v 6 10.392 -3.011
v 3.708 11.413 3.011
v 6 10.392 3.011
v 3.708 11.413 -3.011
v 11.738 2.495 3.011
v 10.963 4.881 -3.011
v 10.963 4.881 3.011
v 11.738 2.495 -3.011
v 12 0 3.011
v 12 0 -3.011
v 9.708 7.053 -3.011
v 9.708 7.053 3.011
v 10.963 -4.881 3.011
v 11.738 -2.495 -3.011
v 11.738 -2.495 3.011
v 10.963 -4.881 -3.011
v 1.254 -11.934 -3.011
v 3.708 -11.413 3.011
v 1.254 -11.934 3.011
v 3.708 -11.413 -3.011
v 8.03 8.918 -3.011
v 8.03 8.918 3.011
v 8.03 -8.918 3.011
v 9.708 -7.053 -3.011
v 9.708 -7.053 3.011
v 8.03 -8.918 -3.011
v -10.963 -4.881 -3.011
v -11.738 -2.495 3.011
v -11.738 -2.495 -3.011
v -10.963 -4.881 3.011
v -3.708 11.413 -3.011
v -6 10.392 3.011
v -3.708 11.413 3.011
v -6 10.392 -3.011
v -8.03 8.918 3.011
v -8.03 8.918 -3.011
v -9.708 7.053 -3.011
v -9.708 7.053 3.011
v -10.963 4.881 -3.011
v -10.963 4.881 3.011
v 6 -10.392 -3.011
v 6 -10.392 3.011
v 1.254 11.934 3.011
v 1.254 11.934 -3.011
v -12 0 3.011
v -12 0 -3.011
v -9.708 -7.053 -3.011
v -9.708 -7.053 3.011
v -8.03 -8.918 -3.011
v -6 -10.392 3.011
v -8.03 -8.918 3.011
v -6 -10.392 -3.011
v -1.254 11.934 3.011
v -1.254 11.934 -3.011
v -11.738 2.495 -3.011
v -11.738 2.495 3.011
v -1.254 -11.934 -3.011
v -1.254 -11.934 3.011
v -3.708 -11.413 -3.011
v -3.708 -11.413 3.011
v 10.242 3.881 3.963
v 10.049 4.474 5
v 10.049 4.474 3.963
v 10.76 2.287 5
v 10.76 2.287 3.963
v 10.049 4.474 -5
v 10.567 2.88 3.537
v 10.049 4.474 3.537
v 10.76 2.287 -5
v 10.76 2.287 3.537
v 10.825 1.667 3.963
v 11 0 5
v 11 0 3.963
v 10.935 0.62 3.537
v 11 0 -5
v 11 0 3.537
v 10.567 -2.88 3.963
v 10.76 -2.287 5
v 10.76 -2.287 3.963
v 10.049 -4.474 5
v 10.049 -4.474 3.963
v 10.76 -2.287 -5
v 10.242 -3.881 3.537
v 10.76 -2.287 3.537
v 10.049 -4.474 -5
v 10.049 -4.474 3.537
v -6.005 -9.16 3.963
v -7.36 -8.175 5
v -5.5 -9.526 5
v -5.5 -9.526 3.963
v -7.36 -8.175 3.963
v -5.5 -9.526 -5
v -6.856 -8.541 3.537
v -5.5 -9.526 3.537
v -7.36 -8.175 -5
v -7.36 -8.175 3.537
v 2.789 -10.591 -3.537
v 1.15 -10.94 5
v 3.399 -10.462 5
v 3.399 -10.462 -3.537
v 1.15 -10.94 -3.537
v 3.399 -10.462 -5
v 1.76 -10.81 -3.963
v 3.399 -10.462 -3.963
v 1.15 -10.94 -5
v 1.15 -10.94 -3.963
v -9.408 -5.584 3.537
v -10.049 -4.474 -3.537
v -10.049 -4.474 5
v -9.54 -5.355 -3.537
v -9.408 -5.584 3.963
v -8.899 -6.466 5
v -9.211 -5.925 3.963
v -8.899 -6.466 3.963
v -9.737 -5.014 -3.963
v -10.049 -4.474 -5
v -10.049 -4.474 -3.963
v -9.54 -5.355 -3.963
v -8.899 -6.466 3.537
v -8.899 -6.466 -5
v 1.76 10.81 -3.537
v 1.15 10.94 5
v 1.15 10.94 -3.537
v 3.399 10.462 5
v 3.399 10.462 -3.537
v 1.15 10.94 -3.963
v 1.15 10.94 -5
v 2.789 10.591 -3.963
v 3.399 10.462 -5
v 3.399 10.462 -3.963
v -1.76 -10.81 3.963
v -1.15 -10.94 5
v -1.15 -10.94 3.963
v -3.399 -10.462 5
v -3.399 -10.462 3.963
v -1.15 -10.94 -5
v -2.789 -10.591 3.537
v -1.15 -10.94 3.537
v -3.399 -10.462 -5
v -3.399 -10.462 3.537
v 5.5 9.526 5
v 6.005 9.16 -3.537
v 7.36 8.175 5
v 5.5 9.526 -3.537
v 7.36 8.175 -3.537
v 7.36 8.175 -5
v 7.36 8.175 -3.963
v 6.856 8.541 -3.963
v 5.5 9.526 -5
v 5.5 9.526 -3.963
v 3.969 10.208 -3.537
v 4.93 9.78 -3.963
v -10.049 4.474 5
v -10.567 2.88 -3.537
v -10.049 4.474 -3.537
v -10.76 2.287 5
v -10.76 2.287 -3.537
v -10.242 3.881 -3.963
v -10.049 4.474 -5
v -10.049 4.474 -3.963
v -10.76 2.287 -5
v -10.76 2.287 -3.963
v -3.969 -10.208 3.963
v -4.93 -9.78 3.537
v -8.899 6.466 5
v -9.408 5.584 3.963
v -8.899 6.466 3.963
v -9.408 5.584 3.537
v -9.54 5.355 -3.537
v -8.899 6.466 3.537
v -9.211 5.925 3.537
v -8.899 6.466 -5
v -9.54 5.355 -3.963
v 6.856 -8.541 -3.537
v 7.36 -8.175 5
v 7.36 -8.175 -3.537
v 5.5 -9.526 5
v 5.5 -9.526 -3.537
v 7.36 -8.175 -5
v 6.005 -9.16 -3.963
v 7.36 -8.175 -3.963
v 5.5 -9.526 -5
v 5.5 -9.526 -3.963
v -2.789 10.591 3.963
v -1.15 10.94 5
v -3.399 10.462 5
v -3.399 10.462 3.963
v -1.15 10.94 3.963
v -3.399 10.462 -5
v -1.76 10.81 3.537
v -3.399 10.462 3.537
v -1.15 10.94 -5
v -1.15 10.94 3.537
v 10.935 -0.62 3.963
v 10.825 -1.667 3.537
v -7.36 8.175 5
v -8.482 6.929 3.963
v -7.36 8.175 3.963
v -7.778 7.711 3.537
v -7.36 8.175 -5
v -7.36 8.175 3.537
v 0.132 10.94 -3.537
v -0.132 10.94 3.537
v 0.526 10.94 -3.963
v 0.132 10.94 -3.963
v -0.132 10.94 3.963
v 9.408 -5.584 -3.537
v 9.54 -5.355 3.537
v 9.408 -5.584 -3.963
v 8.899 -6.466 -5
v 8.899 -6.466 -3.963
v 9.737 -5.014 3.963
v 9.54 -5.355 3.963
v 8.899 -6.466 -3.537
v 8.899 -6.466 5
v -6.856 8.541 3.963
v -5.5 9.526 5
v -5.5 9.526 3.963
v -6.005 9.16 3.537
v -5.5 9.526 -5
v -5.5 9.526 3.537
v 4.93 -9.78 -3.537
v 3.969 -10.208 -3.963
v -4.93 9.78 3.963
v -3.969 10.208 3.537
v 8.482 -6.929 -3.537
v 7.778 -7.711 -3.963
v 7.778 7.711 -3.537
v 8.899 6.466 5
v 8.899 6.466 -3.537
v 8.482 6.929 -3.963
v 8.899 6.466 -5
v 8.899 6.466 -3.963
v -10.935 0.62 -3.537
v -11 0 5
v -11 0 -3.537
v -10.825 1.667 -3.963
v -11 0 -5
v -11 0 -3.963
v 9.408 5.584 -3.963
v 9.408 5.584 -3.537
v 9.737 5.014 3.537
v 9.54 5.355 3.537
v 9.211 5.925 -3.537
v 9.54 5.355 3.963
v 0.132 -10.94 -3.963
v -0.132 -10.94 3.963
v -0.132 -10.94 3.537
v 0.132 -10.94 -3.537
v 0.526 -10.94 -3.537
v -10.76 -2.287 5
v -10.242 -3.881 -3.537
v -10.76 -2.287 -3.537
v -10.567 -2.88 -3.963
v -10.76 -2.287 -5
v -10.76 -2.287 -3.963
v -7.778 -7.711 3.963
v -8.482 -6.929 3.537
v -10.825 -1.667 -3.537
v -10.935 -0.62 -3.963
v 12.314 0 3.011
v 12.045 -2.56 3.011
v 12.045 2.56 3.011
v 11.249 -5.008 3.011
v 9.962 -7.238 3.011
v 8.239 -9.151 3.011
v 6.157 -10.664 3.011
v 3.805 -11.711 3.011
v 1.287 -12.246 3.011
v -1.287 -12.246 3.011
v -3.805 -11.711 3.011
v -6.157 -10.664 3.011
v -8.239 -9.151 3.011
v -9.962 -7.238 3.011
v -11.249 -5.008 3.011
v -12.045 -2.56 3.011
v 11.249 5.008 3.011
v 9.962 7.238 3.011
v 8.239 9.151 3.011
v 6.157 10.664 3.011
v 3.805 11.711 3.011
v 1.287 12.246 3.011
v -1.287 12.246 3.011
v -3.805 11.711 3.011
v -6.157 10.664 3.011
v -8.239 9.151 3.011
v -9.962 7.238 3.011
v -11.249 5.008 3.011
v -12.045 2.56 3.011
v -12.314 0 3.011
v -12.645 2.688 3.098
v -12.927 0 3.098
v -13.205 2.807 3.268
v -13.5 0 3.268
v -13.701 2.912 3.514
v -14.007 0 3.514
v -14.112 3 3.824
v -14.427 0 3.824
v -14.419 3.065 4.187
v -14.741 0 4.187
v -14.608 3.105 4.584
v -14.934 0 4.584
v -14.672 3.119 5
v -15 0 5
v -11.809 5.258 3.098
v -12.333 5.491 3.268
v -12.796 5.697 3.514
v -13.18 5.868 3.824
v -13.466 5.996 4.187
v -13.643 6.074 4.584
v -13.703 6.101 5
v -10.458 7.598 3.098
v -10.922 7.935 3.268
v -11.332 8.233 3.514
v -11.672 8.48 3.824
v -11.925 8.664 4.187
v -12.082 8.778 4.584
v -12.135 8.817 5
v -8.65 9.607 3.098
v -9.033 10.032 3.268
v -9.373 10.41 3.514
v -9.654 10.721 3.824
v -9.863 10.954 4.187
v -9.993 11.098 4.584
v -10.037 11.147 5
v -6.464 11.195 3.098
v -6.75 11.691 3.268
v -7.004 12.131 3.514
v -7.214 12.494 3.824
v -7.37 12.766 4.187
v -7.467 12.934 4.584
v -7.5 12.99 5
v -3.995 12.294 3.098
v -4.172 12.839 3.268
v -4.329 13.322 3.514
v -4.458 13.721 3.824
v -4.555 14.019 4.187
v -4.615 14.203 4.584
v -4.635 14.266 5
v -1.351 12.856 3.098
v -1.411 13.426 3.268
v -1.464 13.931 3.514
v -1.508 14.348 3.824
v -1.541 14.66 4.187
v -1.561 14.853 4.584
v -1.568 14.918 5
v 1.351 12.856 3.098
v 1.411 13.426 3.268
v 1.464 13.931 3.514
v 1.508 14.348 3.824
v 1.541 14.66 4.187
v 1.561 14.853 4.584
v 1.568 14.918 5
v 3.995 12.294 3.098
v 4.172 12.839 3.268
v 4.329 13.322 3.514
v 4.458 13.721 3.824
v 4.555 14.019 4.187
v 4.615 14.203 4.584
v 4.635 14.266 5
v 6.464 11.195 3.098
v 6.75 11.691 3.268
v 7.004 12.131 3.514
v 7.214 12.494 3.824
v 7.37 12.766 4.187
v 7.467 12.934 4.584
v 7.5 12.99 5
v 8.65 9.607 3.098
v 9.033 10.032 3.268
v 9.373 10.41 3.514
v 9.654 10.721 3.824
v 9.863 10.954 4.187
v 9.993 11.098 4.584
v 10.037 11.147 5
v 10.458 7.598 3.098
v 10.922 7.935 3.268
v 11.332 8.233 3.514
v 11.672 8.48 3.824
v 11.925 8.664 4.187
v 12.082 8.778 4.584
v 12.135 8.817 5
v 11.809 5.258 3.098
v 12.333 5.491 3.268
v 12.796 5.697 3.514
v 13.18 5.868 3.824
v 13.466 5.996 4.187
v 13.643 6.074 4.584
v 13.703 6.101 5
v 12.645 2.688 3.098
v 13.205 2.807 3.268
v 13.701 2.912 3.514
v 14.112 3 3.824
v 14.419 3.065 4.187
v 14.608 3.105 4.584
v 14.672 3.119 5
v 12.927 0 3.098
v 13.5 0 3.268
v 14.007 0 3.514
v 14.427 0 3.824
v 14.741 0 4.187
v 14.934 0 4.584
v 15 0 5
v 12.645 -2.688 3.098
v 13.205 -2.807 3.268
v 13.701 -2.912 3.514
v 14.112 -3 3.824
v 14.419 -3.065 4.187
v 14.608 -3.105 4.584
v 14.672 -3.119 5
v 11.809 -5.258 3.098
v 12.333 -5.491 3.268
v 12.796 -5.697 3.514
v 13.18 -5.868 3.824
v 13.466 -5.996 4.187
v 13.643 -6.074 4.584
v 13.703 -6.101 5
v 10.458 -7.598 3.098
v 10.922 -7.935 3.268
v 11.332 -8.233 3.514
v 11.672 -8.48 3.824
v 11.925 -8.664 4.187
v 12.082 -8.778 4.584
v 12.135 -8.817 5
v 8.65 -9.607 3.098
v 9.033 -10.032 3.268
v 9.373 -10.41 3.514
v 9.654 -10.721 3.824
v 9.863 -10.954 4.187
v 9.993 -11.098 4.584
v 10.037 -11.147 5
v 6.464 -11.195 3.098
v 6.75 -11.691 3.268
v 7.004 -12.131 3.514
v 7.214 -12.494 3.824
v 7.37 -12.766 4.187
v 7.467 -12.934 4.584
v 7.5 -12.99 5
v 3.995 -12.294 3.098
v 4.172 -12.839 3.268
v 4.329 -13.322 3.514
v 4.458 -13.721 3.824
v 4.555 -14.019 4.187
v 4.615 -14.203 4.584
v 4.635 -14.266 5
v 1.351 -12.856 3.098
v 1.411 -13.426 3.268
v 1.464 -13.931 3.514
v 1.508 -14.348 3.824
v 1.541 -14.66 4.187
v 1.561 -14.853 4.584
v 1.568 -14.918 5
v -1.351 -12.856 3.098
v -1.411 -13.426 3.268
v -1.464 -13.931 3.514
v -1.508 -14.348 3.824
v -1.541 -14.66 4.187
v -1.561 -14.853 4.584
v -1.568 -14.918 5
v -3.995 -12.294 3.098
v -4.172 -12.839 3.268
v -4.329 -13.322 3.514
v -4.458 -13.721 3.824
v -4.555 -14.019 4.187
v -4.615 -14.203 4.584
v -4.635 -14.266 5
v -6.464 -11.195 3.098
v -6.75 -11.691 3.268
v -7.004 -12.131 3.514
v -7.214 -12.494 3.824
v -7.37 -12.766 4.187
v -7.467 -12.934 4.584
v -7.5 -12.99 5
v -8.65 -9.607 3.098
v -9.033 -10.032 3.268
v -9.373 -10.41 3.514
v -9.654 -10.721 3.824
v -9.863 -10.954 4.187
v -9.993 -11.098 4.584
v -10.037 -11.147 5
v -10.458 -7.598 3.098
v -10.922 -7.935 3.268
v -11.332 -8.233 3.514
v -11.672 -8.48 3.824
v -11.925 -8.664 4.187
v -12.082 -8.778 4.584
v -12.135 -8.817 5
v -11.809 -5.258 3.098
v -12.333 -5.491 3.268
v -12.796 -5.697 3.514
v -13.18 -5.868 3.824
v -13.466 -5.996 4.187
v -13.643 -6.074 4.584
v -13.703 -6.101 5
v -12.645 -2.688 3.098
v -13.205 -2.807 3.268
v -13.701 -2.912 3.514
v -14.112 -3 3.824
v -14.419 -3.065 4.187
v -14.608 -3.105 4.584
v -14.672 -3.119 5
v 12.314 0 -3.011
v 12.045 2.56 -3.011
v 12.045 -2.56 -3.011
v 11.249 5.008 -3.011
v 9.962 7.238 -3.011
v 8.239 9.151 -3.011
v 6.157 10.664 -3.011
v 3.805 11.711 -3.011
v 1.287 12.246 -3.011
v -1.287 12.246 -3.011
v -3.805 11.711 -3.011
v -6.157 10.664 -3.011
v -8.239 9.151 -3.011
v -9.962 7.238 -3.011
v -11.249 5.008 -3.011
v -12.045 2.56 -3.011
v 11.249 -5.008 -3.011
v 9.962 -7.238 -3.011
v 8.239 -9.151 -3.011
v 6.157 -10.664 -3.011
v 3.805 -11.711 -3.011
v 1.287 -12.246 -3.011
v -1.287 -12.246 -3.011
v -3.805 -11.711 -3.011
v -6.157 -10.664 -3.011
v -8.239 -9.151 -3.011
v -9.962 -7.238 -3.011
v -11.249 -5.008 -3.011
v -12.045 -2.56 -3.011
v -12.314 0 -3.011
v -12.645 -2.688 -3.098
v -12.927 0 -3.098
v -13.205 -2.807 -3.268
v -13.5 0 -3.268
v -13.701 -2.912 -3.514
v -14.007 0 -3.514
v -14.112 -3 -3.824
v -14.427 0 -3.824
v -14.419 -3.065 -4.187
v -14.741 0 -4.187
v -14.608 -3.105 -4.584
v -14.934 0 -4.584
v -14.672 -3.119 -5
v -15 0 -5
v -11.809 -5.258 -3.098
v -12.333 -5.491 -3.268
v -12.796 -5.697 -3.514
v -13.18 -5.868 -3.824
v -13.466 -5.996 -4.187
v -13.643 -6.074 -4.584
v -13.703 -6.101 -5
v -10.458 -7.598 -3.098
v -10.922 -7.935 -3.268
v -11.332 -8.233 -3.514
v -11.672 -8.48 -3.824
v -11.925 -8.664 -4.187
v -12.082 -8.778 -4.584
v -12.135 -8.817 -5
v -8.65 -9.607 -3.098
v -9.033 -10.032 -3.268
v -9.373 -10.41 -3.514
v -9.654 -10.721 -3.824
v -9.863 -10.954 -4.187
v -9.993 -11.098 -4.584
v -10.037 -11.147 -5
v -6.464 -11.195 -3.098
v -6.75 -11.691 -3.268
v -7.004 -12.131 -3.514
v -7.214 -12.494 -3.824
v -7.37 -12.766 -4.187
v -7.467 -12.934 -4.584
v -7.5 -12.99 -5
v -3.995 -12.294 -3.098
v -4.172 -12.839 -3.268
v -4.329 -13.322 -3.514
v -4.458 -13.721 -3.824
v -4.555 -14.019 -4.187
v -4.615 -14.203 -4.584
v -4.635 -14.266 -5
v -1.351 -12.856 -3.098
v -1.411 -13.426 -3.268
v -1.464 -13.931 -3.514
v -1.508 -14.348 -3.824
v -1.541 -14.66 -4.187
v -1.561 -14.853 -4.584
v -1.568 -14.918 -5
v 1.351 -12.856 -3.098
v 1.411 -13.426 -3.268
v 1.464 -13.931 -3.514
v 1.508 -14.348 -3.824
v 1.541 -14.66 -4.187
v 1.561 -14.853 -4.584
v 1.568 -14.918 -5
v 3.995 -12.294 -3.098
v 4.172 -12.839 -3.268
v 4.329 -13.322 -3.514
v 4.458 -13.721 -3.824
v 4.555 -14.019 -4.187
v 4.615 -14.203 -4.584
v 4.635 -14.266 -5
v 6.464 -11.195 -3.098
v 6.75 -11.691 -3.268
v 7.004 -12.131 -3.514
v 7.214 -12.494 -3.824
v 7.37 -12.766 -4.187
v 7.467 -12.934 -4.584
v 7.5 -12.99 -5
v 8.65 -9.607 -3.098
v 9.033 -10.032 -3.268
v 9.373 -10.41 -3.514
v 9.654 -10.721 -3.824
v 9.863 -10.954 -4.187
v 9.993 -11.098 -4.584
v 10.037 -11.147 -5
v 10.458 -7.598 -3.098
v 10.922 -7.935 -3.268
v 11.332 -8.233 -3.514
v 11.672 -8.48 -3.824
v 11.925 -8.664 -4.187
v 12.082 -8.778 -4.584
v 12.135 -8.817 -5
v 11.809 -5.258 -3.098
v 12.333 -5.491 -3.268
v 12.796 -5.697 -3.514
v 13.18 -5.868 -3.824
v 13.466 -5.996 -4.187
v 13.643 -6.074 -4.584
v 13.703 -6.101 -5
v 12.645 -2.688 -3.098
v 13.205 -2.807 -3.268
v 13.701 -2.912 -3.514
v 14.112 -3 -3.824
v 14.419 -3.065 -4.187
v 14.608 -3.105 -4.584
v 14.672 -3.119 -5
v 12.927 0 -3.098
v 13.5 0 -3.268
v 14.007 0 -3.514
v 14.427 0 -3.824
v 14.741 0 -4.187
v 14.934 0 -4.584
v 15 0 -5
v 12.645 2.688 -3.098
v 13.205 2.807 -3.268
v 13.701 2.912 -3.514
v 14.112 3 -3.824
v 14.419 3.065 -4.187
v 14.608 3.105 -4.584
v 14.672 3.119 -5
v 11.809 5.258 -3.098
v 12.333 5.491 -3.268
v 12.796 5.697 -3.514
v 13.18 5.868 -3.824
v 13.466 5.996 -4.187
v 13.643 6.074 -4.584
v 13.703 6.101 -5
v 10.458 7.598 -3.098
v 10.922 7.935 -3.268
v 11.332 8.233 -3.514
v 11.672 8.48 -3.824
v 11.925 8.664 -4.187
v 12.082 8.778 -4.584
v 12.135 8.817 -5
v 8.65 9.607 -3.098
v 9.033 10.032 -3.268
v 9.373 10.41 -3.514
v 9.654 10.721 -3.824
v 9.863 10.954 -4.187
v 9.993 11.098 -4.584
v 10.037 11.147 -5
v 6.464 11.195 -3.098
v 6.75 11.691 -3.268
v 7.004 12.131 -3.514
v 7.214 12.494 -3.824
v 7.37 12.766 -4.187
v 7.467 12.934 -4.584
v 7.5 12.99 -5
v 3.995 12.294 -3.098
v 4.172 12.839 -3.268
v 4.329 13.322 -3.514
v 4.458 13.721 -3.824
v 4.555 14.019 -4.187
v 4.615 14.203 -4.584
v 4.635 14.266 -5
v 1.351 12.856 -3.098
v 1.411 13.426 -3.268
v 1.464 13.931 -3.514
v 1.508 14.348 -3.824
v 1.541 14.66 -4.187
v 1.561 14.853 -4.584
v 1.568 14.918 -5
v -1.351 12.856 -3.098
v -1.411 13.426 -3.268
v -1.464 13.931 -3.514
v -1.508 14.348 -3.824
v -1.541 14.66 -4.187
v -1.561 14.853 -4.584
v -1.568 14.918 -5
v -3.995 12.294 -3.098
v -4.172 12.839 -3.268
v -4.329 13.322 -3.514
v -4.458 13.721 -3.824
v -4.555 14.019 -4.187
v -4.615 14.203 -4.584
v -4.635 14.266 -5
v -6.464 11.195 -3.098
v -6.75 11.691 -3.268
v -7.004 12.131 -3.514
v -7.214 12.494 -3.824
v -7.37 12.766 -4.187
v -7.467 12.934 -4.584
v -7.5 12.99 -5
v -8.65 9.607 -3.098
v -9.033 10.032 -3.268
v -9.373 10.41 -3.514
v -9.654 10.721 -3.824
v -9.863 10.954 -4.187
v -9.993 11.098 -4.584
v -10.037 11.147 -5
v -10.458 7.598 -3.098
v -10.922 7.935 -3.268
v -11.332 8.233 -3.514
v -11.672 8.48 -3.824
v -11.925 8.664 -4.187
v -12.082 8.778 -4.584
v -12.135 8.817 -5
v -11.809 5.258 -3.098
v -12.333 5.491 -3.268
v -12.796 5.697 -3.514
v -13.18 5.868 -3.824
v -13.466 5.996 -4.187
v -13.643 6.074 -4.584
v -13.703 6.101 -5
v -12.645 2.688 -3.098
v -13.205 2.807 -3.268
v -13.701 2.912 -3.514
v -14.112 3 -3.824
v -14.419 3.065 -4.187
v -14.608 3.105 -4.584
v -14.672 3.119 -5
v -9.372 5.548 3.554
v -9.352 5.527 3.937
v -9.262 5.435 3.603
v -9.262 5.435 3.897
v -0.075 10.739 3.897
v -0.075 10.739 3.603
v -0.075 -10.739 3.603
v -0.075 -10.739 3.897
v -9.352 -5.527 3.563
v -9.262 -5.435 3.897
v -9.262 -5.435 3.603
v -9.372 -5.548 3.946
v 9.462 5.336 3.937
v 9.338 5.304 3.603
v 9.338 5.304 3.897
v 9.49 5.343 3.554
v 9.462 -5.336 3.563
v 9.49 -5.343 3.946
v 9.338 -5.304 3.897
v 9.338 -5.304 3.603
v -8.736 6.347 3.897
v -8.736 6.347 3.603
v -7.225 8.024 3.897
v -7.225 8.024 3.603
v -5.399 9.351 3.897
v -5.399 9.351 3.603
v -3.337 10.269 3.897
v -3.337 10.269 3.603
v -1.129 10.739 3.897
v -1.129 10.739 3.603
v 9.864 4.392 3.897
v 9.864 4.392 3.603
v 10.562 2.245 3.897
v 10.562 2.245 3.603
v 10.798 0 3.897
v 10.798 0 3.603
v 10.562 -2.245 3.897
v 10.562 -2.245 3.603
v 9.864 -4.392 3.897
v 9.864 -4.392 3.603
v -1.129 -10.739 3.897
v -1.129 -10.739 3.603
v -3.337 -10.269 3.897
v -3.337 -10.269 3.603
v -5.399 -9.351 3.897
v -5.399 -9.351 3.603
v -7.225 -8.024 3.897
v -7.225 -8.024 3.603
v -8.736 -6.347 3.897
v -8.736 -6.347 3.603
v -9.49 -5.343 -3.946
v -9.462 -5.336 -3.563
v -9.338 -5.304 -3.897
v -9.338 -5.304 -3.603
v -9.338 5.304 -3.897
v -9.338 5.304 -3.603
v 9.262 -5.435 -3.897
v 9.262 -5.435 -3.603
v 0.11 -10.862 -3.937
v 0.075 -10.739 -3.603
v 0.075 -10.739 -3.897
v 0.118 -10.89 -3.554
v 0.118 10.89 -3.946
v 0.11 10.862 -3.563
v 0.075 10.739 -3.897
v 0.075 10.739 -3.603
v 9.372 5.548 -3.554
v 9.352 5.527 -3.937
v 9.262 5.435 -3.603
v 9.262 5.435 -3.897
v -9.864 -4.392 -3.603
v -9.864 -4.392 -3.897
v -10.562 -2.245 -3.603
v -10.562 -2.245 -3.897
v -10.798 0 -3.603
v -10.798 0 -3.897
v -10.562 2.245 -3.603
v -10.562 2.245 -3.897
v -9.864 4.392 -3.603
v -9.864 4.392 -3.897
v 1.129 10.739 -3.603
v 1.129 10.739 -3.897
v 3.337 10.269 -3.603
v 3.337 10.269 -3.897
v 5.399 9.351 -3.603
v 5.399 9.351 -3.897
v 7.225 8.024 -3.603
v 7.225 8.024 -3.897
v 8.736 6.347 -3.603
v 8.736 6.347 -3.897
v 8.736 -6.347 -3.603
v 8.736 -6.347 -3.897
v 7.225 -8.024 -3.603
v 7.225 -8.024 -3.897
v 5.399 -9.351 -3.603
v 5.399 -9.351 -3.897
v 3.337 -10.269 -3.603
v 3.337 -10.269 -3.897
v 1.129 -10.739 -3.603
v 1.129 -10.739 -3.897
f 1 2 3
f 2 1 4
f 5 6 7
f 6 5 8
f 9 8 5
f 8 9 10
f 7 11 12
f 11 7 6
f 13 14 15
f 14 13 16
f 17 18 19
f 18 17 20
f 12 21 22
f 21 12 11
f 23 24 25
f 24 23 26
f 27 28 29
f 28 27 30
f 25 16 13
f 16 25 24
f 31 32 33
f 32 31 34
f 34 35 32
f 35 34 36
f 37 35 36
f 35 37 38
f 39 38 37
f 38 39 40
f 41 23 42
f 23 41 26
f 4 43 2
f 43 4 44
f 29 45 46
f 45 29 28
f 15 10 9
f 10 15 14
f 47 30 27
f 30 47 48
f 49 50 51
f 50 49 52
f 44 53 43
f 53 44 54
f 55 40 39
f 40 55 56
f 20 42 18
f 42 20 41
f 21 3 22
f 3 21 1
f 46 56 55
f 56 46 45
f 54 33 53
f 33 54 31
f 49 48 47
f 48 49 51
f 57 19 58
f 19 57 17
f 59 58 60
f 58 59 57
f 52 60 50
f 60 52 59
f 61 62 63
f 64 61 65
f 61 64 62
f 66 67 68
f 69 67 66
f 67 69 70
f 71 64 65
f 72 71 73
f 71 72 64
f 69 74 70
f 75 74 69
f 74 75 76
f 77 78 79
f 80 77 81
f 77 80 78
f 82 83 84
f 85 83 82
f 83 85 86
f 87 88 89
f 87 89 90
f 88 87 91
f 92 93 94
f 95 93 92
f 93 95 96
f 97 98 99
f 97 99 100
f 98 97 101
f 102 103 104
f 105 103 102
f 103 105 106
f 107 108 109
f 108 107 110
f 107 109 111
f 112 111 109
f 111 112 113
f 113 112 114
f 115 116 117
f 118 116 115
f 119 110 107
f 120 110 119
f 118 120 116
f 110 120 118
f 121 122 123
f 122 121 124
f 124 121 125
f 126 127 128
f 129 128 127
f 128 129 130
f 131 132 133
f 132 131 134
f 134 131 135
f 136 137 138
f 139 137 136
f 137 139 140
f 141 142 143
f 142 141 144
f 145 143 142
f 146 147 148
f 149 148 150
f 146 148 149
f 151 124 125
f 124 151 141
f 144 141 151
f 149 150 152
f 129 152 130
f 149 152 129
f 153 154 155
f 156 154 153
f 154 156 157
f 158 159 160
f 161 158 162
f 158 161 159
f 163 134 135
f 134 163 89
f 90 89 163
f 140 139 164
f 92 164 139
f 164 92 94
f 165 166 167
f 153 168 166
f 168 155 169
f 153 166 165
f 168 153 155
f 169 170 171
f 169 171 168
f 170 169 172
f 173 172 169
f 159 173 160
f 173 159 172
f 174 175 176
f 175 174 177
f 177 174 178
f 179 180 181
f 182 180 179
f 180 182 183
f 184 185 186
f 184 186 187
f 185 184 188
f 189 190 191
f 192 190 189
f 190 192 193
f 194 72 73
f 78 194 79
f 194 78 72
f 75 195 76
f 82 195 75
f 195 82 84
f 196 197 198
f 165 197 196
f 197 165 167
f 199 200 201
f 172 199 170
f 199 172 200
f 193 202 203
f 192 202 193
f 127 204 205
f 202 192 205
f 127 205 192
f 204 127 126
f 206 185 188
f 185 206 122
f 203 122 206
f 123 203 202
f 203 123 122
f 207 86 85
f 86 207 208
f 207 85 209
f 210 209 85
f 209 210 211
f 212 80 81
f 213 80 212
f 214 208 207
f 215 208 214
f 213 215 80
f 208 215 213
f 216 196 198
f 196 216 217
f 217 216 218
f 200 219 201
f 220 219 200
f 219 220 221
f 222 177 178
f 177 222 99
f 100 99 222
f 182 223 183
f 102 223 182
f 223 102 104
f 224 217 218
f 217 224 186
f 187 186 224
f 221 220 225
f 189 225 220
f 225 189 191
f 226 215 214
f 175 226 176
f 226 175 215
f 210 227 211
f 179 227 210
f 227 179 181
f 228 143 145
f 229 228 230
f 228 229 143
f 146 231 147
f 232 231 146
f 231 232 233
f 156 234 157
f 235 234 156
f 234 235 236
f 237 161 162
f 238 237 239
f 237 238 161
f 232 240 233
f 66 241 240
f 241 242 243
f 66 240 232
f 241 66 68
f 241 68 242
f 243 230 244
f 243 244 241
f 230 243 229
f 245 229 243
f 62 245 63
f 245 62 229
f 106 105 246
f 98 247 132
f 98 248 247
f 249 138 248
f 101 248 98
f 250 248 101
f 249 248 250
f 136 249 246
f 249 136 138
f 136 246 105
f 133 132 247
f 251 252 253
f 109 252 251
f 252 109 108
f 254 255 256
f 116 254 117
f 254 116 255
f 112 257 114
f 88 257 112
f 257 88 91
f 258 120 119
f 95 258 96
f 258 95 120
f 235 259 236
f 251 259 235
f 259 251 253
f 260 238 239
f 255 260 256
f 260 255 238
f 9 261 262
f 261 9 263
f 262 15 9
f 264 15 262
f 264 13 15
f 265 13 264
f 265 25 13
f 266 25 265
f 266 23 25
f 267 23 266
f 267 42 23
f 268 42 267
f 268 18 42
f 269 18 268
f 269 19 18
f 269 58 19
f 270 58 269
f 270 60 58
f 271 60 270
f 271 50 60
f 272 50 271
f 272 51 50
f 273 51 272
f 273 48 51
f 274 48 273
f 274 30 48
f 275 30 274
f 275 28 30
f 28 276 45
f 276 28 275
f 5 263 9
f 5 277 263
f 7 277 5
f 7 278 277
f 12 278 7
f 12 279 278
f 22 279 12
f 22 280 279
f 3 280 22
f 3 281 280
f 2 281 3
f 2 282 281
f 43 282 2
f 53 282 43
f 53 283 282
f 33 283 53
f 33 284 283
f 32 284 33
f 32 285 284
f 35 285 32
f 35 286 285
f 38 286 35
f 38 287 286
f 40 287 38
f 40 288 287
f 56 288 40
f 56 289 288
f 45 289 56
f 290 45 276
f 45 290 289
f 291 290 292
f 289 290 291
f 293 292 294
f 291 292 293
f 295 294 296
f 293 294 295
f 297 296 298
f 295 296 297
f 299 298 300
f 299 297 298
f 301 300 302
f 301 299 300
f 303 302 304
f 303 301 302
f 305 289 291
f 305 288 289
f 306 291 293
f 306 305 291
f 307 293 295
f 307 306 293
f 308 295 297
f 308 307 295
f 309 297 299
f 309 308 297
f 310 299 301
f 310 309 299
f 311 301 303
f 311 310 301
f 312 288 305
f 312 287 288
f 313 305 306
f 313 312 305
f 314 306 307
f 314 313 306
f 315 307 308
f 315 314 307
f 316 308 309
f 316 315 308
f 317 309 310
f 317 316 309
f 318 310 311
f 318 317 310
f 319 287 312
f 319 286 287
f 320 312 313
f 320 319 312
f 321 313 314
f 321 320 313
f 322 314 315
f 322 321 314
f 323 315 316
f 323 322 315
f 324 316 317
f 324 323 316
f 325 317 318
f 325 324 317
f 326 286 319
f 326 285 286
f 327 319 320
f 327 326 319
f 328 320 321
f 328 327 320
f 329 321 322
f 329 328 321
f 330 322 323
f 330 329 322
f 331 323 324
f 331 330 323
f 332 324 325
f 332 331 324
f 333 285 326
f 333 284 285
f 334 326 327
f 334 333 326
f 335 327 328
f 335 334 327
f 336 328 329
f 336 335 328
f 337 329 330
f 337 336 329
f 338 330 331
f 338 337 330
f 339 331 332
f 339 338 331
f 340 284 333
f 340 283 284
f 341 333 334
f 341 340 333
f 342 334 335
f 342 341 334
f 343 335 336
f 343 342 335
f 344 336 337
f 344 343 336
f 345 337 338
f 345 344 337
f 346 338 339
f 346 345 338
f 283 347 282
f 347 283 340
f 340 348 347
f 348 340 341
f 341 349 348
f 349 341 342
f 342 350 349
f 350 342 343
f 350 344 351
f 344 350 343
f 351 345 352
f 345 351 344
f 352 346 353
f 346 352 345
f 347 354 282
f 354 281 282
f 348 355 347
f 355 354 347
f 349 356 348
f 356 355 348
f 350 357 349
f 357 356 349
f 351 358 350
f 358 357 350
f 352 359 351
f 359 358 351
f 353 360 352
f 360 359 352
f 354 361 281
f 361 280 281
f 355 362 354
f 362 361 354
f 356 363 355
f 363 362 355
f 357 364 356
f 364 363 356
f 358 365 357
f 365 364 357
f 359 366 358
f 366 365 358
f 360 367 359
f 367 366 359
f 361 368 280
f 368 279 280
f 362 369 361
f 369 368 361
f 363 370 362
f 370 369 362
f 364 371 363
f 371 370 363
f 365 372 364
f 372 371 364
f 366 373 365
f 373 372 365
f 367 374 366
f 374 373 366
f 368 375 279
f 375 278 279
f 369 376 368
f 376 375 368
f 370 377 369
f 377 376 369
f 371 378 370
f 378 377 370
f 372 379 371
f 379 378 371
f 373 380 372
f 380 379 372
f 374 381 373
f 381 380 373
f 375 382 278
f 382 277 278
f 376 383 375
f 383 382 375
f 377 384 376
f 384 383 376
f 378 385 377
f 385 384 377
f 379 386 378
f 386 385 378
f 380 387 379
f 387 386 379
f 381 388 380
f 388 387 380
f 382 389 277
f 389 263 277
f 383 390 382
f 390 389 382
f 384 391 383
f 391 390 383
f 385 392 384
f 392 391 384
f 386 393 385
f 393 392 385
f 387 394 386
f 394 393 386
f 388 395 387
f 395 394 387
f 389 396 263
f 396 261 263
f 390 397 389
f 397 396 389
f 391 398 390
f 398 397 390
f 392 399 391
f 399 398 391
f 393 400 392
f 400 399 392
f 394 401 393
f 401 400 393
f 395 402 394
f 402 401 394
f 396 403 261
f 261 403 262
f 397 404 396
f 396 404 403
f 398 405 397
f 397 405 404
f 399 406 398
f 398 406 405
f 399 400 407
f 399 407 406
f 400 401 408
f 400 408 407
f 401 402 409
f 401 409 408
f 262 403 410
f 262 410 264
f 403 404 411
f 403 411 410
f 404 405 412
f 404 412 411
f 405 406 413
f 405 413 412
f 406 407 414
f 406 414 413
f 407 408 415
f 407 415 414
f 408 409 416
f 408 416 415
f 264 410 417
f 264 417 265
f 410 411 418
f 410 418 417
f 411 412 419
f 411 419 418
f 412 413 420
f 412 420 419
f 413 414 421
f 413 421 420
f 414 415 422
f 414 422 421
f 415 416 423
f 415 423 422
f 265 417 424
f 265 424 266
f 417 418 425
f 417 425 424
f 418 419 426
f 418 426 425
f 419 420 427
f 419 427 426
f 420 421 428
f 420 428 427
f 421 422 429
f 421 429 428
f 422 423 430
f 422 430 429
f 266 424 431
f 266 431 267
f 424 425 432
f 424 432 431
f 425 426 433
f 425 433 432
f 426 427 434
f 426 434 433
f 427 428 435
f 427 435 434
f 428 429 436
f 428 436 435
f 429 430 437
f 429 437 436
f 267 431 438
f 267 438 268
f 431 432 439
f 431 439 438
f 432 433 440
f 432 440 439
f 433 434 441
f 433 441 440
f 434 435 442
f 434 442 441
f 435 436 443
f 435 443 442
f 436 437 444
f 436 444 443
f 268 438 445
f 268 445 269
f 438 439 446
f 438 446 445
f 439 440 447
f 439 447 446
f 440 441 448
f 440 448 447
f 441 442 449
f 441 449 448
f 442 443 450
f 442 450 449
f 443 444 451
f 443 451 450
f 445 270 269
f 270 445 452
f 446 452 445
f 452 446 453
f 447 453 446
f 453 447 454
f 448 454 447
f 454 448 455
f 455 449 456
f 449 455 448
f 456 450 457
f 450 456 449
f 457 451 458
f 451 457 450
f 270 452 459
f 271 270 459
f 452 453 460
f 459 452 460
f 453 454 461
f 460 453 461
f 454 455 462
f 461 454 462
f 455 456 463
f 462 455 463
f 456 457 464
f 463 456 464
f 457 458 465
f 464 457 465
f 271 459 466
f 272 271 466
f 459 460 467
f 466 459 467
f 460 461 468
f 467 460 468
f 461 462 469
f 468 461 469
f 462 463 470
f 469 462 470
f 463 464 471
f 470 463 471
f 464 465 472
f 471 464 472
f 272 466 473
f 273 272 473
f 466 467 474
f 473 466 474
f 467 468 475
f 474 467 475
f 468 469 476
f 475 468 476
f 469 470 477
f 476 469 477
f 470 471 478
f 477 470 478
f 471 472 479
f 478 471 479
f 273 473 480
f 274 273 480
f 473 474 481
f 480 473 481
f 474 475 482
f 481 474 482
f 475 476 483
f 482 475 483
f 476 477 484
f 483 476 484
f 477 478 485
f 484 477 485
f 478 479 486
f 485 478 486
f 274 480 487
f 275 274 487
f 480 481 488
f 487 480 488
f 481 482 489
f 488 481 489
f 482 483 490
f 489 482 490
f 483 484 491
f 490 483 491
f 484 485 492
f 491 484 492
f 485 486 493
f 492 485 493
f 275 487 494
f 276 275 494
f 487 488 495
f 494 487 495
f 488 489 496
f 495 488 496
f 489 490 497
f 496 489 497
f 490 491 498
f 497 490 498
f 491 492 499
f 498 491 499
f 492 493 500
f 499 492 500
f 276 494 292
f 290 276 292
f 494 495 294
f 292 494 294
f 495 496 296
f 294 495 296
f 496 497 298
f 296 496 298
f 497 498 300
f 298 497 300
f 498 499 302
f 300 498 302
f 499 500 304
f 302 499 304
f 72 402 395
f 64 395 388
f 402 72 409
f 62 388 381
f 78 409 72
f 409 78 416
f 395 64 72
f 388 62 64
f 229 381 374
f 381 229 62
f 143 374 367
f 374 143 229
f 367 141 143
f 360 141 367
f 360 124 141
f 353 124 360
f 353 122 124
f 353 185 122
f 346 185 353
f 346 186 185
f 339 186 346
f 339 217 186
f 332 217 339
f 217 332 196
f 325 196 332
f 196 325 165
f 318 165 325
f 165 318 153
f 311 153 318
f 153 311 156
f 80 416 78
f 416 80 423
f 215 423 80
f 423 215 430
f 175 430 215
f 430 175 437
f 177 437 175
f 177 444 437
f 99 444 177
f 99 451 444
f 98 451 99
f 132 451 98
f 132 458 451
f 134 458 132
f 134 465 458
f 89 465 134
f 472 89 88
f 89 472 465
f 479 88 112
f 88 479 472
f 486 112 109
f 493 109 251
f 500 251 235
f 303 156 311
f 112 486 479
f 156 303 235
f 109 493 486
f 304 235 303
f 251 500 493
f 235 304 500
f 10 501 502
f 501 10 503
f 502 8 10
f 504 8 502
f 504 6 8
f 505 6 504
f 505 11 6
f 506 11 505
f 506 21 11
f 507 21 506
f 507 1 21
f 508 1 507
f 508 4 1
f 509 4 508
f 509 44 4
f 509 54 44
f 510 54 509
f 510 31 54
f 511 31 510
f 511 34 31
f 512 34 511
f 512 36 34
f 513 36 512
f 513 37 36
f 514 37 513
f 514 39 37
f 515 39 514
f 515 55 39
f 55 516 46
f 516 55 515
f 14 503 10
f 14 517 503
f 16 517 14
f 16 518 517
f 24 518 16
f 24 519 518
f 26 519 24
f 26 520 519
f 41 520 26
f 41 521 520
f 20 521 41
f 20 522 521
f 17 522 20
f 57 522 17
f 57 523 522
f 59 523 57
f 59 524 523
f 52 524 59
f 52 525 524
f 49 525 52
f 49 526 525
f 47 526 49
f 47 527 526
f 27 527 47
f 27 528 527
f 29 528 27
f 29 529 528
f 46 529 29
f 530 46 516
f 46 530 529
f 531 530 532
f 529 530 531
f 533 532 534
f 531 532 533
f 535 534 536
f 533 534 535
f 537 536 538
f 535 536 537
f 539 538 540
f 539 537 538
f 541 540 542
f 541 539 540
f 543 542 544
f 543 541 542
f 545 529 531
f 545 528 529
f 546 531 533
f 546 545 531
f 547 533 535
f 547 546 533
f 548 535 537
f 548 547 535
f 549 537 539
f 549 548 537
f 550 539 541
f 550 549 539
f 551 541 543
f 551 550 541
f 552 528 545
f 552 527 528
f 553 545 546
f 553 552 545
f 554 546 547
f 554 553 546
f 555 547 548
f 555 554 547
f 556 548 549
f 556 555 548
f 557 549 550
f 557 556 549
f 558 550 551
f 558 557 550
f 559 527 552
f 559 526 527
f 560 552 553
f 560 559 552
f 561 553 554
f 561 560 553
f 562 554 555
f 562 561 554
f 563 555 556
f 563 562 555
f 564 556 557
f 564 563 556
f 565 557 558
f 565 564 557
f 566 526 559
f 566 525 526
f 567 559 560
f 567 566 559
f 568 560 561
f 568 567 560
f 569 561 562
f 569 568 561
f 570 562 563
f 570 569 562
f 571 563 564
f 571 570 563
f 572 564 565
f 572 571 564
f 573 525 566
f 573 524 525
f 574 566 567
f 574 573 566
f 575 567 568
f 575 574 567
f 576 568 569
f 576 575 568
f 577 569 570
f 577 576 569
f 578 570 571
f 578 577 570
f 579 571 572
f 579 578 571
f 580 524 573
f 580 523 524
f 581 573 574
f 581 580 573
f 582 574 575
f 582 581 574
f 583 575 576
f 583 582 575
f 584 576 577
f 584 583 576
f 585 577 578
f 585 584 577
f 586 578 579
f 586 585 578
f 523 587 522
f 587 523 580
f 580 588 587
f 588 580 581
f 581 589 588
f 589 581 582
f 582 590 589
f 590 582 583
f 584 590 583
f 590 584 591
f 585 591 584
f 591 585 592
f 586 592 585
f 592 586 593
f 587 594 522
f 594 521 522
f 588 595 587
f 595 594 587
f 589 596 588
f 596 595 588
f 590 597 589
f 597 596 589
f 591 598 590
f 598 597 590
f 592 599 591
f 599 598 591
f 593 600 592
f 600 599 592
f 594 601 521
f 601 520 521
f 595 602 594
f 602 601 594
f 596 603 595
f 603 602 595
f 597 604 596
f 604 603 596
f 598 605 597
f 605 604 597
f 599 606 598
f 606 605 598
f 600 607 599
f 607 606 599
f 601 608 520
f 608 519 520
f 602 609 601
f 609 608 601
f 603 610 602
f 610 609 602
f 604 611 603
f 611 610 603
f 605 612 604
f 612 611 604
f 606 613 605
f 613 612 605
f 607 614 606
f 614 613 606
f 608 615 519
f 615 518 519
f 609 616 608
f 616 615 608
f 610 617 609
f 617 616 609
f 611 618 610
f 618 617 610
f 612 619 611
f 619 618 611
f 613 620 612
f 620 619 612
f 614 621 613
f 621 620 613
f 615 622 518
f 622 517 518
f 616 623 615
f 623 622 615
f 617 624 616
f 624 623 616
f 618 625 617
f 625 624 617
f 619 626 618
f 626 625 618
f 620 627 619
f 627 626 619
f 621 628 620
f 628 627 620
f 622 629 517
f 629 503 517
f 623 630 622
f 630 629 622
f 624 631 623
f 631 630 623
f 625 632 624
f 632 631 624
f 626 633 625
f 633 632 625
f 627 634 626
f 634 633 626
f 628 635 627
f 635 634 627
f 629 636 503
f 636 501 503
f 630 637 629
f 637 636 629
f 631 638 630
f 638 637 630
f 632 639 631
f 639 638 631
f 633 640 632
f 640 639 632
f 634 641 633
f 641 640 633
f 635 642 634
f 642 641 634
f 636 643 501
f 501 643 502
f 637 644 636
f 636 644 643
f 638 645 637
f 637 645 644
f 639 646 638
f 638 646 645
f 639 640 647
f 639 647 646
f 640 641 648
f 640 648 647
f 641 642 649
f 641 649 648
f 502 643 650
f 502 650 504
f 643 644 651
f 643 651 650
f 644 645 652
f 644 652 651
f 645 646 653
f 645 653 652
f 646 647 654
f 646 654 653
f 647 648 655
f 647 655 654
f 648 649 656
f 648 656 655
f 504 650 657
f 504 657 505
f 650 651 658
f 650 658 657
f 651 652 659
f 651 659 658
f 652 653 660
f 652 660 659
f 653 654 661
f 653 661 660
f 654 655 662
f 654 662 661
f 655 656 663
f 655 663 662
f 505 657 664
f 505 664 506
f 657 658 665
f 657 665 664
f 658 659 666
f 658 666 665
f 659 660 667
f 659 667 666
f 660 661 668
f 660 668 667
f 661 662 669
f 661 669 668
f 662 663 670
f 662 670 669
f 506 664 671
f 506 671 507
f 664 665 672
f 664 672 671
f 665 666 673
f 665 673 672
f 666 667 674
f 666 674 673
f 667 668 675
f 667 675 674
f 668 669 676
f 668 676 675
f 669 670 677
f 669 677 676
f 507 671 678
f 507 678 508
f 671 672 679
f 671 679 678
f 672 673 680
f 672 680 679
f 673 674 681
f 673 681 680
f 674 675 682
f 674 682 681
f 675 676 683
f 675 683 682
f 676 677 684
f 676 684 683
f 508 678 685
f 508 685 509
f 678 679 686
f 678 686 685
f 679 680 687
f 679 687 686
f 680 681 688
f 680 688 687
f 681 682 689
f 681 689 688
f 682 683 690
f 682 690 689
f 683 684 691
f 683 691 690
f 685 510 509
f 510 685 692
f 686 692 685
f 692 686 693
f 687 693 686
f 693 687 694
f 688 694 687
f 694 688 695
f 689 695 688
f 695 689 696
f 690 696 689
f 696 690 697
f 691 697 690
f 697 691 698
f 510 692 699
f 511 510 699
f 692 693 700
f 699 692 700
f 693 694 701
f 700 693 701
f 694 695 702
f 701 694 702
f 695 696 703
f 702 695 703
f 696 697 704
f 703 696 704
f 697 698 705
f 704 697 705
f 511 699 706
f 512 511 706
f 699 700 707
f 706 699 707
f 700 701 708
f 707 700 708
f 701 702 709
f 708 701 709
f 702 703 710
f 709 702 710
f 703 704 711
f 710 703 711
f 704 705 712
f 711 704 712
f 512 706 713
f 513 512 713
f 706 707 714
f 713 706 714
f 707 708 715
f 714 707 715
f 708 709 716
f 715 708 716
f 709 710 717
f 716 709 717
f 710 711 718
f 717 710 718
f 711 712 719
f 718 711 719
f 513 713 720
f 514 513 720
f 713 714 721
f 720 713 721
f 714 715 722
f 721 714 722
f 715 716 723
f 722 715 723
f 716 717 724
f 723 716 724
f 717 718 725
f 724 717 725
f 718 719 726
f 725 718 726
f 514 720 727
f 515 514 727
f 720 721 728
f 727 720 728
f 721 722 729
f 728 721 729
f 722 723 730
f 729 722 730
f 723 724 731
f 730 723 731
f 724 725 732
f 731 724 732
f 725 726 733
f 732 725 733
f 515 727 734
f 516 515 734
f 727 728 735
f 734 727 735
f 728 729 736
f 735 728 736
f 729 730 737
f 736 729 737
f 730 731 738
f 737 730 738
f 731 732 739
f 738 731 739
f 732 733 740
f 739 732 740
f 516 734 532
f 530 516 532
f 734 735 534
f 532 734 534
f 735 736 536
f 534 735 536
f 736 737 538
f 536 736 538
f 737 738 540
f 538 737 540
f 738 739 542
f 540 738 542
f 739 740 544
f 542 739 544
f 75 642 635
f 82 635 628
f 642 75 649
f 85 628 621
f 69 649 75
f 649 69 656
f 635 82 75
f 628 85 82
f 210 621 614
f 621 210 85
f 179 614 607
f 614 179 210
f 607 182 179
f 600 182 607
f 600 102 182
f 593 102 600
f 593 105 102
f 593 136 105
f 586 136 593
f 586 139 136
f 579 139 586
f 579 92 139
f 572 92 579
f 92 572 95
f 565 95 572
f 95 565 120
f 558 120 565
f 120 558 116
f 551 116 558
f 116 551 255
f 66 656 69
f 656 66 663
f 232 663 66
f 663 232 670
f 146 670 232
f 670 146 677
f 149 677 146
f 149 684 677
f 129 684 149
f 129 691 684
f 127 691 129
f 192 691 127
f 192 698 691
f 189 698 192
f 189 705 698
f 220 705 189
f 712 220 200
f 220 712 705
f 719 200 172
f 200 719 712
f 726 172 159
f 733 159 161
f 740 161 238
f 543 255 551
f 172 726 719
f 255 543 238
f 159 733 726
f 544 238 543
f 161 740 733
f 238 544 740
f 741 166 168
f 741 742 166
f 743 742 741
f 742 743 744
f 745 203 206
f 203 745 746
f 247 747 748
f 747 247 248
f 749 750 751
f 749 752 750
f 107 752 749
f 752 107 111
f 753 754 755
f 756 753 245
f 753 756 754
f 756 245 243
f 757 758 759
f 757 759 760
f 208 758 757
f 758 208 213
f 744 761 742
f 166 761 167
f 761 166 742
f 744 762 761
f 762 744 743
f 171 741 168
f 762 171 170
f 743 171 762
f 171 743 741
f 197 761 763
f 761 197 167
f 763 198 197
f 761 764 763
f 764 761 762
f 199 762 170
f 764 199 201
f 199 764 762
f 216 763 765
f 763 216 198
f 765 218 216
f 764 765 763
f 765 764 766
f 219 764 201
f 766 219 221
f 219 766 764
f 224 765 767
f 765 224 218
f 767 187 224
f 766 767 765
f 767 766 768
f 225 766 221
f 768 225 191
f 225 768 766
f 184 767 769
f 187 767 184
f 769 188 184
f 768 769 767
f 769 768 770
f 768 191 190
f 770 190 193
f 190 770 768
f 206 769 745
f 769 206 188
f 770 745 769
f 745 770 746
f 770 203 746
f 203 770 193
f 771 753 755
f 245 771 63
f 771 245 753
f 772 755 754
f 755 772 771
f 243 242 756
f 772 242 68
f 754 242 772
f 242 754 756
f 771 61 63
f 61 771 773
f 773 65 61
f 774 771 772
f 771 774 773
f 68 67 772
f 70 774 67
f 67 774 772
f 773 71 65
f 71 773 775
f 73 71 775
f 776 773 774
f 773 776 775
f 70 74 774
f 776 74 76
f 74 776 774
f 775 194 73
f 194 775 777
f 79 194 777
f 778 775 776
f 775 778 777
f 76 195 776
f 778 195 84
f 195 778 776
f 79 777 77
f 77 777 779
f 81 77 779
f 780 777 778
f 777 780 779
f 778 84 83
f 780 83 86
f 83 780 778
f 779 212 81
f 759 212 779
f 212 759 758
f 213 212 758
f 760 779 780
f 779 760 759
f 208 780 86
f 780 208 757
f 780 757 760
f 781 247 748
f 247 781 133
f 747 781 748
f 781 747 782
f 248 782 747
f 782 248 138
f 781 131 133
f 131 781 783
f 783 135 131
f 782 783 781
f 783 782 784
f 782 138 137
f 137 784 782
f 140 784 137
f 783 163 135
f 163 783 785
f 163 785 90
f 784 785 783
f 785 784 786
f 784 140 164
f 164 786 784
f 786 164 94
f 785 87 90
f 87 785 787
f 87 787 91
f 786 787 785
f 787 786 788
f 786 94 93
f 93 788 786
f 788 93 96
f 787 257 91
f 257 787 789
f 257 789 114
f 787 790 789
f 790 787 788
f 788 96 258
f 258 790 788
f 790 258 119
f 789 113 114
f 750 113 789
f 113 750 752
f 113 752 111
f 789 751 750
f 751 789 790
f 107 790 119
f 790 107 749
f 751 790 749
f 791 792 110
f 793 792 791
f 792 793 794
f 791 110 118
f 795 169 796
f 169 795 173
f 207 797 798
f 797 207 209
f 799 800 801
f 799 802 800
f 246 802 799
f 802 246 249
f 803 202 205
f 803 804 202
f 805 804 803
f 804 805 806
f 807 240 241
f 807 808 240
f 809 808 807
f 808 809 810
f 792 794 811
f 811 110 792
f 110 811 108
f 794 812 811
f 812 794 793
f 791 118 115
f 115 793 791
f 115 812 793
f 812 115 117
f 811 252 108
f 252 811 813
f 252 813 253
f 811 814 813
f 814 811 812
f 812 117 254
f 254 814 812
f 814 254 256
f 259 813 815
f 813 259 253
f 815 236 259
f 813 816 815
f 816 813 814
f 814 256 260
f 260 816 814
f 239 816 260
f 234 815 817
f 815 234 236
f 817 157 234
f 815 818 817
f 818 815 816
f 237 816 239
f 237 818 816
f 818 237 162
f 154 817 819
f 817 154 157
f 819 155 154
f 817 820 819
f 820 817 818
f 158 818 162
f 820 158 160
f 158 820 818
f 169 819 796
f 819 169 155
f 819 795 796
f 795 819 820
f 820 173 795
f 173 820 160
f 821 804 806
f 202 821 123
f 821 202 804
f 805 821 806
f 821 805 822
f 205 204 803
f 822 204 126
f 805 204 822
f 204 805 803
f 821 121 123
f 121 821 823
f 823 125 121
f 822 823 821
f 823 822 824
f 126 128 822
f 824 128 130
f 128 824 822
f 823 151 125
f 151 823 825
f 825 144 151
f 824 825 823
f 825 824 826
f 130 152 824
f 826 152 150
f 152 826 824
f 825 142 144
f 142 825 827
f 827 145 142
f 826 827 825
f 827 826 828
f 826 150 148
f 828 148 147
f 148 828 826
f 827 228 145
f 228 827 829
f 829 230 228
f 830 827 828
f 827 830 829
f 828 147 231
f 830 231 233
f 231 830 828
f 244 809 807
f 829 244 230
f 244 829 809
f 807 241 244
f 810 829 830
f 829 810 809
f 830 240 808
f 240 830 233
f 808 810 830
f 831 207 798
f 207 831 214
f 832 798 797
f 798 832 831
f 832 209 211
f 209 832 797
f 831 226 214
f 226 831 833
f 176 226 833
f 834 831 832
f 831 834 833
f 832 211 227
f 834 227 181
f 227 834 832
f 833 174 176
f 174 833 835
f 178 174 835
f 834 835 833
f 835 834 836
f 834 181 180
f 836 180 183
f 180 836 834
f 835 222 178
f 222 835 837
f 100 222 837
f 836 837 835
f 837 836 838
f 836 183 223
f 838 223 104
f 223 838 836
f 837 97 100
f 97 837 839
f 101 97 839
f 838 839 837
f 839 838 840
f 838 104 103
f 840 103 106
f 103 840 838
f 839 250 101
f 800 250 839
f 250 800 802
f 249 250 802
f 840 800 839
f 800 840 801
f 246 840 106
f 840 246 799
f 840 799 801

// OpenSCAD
// [FL_INDEX: keywords="openscad, 3d_parametric, Parametric_Pulley, csg_solid" | COT="Parametric OpenSCAD design from 3DCodeverse"]
// Title: Parametric Pulley

// Copyright (c) 2013 by Jean-Louis Paquelin (jlp6k).
// This work is licensed under the Creative Commons Attribution
// Partage dans les Mêmes Conditions 3.0 France License.
// To view a copy of this license, visit http://creativecommons.org/licenses/by-sa/3.0/fr/
// CC-BY-SA

// Inspired by http://www.thingiverse.com/thing:3970
// Created 2013-02-20
// Last modified 2013-02-20

// dimensions are set in millimeters

Bearing_Outer_Diameter = 22;
Bearing_Width = 7;

Belt_Width = 6;

Pulley_Thickness = 1;

Flange_Depth = 3;
Flange_Thickness = 2;
Flange_Shape = 2; // [1:square, 2:round]

Rim_Thickness = 0.5;
Rim_Count = 3;

pulley(Bearing_Outer_Diameter, Bearing_Width, Belt_Width, Pulley_Thickness, Flange_Depth, Flange_Thickness, Flange_Shape, Rim_Thickness, Rim_Count);

module pulley(Bearing_Outer_Diameter, Bearing_Width, Belt_Width, Pulley_Thickness, Flange_Depth, Flange_Thickness, Flange_Shape, Rim_Thickness, Rim_Count) {
    width = max(Bearing_Width, Belt_Width);
    union() {
        // pulley base
        difference() {
            cylinder(h = width + (Rim_Thickness * 2), r = (Bearing_Outer_Diameter / 2) + Pulley_Thickness, center = true);
            cylinder(h = width + (Rim_Thickness * 2) + 1, r = (Bearing_Outer_Diameter / 2), center = true);
        }
        
        // add pulley flanges
        translate([0, 0, (Belt_Width + Flange_Thickness) / 2])
            pulley_flange(Bearing_Outer_Diameter, Pulley_Thickness, Flange_Depth, Flange_Thickness, Flange_Shape);
        translate([0, 0, -(Belt_Width + Flange_Thickness) / 2])
            rotate([180, 0, 0])
                pulley_flange(Bearing_Outer_Diameter, Pulley_Thickness, Flange_Depth, Flange_Thickness, Flange_Shape);
            
        // add pulley rims
        translate([0, 0, (Bearing_Width + Rim_Thickness) / 2])
            pulley_rim(Bearing_Outer_Diameter, Rim_Thickness, Rim_Count);
        translate([0, 0, -(Bearing_Width + Rim_Thickness) / 2])
            rotate([0, 0, 180 / Rim_Count])
                pulley_rim(Bearing_Outer_Diameter, Rim_Thickness, Rim_Count);
    }
}

module pulley_flange(Bearing_Outer_Diameter, Pulley_Thickness, Flange_Depth, Flange_Thickness, Flange_Shape) {
    if(Flange_Shape == 2) {
        // round flange
        translate([0, 0, Flange_Thickness / 2])
            difference() {
                union() {
                    rotate_extrude(convexity = 10)
                        translate([(Bearing_Outer_Diameter / 2) + Pulley_Thickness, 0, 0])
                            scale([Flange_Depth / Flange_Thickness, 1, 1])
                                circle(r = Flange_Thickness, $fn = 30);
                    cylinder(h = Flange_Thickness * 2, r = (Bearing_Outer_Diameter / 2) + Pulley_Thickness, center = true);
                }
                cylinder(h = (Flange_Thickness * 2) + 1, r = (Bearing_Outer_Diameter / 2), center = true);
                translate([0, 0, (Flange_Thickness + 1)/ 2])
                    cube([Bearing_Outer_Diameter + (2 * (Pulley_Thickness + Flange_Depth)), Bearing_Outer_Diameter + (2 * (Pulley_Thickness + Flange_Depth)), Flange_Thickness + 1], center = true);
            }
    } else {
        // square flange
        difference() {
            cylinder(h = Flange_Thickness, r = (Bearing_Outer_Diameter / 2) + Pulley_Thickness + Flange_Depth, center = true);
            cylinder(h = Flange_Thickness + 1, r = (Bearing_Outer_Diameter / 2), center = true);
        }
    }
}

module pulley_full_rim(Bearing_Outer_Diameter, Rim_Thickness) {
    rotate_extrude(convexity = 10)
        translate([Bearing_Outer_Diameter / 2, 0, 0])
            circle(r = Rim_Thickness / 2);
}

module pulley_rim(Bearing_Outer_Diameter, Rim_Thickness, Rim_Count) {
    if(Rim_Count < 2) {
        pulley_full_rim(Bearing_Outer_Diameter, Rim_Thickness);
    } else {
        intersection() {
            pulley_full_rim(Bearing_Outer_Diameter, Rim_Thickness);
            union() {
                for(index = [1 : Rim_Count]) {
                    rotate([0, 0, (index * 360) / Rim_Count])
                        translate([(Bearing_Outer_Diameter + Rim_Thickness)/ 2, 0, 0])
                            sphere(r = (Bearing_Outer_Diameter * PI) / (Rim_Count * 4));
                }
            }
        }
    }
}
